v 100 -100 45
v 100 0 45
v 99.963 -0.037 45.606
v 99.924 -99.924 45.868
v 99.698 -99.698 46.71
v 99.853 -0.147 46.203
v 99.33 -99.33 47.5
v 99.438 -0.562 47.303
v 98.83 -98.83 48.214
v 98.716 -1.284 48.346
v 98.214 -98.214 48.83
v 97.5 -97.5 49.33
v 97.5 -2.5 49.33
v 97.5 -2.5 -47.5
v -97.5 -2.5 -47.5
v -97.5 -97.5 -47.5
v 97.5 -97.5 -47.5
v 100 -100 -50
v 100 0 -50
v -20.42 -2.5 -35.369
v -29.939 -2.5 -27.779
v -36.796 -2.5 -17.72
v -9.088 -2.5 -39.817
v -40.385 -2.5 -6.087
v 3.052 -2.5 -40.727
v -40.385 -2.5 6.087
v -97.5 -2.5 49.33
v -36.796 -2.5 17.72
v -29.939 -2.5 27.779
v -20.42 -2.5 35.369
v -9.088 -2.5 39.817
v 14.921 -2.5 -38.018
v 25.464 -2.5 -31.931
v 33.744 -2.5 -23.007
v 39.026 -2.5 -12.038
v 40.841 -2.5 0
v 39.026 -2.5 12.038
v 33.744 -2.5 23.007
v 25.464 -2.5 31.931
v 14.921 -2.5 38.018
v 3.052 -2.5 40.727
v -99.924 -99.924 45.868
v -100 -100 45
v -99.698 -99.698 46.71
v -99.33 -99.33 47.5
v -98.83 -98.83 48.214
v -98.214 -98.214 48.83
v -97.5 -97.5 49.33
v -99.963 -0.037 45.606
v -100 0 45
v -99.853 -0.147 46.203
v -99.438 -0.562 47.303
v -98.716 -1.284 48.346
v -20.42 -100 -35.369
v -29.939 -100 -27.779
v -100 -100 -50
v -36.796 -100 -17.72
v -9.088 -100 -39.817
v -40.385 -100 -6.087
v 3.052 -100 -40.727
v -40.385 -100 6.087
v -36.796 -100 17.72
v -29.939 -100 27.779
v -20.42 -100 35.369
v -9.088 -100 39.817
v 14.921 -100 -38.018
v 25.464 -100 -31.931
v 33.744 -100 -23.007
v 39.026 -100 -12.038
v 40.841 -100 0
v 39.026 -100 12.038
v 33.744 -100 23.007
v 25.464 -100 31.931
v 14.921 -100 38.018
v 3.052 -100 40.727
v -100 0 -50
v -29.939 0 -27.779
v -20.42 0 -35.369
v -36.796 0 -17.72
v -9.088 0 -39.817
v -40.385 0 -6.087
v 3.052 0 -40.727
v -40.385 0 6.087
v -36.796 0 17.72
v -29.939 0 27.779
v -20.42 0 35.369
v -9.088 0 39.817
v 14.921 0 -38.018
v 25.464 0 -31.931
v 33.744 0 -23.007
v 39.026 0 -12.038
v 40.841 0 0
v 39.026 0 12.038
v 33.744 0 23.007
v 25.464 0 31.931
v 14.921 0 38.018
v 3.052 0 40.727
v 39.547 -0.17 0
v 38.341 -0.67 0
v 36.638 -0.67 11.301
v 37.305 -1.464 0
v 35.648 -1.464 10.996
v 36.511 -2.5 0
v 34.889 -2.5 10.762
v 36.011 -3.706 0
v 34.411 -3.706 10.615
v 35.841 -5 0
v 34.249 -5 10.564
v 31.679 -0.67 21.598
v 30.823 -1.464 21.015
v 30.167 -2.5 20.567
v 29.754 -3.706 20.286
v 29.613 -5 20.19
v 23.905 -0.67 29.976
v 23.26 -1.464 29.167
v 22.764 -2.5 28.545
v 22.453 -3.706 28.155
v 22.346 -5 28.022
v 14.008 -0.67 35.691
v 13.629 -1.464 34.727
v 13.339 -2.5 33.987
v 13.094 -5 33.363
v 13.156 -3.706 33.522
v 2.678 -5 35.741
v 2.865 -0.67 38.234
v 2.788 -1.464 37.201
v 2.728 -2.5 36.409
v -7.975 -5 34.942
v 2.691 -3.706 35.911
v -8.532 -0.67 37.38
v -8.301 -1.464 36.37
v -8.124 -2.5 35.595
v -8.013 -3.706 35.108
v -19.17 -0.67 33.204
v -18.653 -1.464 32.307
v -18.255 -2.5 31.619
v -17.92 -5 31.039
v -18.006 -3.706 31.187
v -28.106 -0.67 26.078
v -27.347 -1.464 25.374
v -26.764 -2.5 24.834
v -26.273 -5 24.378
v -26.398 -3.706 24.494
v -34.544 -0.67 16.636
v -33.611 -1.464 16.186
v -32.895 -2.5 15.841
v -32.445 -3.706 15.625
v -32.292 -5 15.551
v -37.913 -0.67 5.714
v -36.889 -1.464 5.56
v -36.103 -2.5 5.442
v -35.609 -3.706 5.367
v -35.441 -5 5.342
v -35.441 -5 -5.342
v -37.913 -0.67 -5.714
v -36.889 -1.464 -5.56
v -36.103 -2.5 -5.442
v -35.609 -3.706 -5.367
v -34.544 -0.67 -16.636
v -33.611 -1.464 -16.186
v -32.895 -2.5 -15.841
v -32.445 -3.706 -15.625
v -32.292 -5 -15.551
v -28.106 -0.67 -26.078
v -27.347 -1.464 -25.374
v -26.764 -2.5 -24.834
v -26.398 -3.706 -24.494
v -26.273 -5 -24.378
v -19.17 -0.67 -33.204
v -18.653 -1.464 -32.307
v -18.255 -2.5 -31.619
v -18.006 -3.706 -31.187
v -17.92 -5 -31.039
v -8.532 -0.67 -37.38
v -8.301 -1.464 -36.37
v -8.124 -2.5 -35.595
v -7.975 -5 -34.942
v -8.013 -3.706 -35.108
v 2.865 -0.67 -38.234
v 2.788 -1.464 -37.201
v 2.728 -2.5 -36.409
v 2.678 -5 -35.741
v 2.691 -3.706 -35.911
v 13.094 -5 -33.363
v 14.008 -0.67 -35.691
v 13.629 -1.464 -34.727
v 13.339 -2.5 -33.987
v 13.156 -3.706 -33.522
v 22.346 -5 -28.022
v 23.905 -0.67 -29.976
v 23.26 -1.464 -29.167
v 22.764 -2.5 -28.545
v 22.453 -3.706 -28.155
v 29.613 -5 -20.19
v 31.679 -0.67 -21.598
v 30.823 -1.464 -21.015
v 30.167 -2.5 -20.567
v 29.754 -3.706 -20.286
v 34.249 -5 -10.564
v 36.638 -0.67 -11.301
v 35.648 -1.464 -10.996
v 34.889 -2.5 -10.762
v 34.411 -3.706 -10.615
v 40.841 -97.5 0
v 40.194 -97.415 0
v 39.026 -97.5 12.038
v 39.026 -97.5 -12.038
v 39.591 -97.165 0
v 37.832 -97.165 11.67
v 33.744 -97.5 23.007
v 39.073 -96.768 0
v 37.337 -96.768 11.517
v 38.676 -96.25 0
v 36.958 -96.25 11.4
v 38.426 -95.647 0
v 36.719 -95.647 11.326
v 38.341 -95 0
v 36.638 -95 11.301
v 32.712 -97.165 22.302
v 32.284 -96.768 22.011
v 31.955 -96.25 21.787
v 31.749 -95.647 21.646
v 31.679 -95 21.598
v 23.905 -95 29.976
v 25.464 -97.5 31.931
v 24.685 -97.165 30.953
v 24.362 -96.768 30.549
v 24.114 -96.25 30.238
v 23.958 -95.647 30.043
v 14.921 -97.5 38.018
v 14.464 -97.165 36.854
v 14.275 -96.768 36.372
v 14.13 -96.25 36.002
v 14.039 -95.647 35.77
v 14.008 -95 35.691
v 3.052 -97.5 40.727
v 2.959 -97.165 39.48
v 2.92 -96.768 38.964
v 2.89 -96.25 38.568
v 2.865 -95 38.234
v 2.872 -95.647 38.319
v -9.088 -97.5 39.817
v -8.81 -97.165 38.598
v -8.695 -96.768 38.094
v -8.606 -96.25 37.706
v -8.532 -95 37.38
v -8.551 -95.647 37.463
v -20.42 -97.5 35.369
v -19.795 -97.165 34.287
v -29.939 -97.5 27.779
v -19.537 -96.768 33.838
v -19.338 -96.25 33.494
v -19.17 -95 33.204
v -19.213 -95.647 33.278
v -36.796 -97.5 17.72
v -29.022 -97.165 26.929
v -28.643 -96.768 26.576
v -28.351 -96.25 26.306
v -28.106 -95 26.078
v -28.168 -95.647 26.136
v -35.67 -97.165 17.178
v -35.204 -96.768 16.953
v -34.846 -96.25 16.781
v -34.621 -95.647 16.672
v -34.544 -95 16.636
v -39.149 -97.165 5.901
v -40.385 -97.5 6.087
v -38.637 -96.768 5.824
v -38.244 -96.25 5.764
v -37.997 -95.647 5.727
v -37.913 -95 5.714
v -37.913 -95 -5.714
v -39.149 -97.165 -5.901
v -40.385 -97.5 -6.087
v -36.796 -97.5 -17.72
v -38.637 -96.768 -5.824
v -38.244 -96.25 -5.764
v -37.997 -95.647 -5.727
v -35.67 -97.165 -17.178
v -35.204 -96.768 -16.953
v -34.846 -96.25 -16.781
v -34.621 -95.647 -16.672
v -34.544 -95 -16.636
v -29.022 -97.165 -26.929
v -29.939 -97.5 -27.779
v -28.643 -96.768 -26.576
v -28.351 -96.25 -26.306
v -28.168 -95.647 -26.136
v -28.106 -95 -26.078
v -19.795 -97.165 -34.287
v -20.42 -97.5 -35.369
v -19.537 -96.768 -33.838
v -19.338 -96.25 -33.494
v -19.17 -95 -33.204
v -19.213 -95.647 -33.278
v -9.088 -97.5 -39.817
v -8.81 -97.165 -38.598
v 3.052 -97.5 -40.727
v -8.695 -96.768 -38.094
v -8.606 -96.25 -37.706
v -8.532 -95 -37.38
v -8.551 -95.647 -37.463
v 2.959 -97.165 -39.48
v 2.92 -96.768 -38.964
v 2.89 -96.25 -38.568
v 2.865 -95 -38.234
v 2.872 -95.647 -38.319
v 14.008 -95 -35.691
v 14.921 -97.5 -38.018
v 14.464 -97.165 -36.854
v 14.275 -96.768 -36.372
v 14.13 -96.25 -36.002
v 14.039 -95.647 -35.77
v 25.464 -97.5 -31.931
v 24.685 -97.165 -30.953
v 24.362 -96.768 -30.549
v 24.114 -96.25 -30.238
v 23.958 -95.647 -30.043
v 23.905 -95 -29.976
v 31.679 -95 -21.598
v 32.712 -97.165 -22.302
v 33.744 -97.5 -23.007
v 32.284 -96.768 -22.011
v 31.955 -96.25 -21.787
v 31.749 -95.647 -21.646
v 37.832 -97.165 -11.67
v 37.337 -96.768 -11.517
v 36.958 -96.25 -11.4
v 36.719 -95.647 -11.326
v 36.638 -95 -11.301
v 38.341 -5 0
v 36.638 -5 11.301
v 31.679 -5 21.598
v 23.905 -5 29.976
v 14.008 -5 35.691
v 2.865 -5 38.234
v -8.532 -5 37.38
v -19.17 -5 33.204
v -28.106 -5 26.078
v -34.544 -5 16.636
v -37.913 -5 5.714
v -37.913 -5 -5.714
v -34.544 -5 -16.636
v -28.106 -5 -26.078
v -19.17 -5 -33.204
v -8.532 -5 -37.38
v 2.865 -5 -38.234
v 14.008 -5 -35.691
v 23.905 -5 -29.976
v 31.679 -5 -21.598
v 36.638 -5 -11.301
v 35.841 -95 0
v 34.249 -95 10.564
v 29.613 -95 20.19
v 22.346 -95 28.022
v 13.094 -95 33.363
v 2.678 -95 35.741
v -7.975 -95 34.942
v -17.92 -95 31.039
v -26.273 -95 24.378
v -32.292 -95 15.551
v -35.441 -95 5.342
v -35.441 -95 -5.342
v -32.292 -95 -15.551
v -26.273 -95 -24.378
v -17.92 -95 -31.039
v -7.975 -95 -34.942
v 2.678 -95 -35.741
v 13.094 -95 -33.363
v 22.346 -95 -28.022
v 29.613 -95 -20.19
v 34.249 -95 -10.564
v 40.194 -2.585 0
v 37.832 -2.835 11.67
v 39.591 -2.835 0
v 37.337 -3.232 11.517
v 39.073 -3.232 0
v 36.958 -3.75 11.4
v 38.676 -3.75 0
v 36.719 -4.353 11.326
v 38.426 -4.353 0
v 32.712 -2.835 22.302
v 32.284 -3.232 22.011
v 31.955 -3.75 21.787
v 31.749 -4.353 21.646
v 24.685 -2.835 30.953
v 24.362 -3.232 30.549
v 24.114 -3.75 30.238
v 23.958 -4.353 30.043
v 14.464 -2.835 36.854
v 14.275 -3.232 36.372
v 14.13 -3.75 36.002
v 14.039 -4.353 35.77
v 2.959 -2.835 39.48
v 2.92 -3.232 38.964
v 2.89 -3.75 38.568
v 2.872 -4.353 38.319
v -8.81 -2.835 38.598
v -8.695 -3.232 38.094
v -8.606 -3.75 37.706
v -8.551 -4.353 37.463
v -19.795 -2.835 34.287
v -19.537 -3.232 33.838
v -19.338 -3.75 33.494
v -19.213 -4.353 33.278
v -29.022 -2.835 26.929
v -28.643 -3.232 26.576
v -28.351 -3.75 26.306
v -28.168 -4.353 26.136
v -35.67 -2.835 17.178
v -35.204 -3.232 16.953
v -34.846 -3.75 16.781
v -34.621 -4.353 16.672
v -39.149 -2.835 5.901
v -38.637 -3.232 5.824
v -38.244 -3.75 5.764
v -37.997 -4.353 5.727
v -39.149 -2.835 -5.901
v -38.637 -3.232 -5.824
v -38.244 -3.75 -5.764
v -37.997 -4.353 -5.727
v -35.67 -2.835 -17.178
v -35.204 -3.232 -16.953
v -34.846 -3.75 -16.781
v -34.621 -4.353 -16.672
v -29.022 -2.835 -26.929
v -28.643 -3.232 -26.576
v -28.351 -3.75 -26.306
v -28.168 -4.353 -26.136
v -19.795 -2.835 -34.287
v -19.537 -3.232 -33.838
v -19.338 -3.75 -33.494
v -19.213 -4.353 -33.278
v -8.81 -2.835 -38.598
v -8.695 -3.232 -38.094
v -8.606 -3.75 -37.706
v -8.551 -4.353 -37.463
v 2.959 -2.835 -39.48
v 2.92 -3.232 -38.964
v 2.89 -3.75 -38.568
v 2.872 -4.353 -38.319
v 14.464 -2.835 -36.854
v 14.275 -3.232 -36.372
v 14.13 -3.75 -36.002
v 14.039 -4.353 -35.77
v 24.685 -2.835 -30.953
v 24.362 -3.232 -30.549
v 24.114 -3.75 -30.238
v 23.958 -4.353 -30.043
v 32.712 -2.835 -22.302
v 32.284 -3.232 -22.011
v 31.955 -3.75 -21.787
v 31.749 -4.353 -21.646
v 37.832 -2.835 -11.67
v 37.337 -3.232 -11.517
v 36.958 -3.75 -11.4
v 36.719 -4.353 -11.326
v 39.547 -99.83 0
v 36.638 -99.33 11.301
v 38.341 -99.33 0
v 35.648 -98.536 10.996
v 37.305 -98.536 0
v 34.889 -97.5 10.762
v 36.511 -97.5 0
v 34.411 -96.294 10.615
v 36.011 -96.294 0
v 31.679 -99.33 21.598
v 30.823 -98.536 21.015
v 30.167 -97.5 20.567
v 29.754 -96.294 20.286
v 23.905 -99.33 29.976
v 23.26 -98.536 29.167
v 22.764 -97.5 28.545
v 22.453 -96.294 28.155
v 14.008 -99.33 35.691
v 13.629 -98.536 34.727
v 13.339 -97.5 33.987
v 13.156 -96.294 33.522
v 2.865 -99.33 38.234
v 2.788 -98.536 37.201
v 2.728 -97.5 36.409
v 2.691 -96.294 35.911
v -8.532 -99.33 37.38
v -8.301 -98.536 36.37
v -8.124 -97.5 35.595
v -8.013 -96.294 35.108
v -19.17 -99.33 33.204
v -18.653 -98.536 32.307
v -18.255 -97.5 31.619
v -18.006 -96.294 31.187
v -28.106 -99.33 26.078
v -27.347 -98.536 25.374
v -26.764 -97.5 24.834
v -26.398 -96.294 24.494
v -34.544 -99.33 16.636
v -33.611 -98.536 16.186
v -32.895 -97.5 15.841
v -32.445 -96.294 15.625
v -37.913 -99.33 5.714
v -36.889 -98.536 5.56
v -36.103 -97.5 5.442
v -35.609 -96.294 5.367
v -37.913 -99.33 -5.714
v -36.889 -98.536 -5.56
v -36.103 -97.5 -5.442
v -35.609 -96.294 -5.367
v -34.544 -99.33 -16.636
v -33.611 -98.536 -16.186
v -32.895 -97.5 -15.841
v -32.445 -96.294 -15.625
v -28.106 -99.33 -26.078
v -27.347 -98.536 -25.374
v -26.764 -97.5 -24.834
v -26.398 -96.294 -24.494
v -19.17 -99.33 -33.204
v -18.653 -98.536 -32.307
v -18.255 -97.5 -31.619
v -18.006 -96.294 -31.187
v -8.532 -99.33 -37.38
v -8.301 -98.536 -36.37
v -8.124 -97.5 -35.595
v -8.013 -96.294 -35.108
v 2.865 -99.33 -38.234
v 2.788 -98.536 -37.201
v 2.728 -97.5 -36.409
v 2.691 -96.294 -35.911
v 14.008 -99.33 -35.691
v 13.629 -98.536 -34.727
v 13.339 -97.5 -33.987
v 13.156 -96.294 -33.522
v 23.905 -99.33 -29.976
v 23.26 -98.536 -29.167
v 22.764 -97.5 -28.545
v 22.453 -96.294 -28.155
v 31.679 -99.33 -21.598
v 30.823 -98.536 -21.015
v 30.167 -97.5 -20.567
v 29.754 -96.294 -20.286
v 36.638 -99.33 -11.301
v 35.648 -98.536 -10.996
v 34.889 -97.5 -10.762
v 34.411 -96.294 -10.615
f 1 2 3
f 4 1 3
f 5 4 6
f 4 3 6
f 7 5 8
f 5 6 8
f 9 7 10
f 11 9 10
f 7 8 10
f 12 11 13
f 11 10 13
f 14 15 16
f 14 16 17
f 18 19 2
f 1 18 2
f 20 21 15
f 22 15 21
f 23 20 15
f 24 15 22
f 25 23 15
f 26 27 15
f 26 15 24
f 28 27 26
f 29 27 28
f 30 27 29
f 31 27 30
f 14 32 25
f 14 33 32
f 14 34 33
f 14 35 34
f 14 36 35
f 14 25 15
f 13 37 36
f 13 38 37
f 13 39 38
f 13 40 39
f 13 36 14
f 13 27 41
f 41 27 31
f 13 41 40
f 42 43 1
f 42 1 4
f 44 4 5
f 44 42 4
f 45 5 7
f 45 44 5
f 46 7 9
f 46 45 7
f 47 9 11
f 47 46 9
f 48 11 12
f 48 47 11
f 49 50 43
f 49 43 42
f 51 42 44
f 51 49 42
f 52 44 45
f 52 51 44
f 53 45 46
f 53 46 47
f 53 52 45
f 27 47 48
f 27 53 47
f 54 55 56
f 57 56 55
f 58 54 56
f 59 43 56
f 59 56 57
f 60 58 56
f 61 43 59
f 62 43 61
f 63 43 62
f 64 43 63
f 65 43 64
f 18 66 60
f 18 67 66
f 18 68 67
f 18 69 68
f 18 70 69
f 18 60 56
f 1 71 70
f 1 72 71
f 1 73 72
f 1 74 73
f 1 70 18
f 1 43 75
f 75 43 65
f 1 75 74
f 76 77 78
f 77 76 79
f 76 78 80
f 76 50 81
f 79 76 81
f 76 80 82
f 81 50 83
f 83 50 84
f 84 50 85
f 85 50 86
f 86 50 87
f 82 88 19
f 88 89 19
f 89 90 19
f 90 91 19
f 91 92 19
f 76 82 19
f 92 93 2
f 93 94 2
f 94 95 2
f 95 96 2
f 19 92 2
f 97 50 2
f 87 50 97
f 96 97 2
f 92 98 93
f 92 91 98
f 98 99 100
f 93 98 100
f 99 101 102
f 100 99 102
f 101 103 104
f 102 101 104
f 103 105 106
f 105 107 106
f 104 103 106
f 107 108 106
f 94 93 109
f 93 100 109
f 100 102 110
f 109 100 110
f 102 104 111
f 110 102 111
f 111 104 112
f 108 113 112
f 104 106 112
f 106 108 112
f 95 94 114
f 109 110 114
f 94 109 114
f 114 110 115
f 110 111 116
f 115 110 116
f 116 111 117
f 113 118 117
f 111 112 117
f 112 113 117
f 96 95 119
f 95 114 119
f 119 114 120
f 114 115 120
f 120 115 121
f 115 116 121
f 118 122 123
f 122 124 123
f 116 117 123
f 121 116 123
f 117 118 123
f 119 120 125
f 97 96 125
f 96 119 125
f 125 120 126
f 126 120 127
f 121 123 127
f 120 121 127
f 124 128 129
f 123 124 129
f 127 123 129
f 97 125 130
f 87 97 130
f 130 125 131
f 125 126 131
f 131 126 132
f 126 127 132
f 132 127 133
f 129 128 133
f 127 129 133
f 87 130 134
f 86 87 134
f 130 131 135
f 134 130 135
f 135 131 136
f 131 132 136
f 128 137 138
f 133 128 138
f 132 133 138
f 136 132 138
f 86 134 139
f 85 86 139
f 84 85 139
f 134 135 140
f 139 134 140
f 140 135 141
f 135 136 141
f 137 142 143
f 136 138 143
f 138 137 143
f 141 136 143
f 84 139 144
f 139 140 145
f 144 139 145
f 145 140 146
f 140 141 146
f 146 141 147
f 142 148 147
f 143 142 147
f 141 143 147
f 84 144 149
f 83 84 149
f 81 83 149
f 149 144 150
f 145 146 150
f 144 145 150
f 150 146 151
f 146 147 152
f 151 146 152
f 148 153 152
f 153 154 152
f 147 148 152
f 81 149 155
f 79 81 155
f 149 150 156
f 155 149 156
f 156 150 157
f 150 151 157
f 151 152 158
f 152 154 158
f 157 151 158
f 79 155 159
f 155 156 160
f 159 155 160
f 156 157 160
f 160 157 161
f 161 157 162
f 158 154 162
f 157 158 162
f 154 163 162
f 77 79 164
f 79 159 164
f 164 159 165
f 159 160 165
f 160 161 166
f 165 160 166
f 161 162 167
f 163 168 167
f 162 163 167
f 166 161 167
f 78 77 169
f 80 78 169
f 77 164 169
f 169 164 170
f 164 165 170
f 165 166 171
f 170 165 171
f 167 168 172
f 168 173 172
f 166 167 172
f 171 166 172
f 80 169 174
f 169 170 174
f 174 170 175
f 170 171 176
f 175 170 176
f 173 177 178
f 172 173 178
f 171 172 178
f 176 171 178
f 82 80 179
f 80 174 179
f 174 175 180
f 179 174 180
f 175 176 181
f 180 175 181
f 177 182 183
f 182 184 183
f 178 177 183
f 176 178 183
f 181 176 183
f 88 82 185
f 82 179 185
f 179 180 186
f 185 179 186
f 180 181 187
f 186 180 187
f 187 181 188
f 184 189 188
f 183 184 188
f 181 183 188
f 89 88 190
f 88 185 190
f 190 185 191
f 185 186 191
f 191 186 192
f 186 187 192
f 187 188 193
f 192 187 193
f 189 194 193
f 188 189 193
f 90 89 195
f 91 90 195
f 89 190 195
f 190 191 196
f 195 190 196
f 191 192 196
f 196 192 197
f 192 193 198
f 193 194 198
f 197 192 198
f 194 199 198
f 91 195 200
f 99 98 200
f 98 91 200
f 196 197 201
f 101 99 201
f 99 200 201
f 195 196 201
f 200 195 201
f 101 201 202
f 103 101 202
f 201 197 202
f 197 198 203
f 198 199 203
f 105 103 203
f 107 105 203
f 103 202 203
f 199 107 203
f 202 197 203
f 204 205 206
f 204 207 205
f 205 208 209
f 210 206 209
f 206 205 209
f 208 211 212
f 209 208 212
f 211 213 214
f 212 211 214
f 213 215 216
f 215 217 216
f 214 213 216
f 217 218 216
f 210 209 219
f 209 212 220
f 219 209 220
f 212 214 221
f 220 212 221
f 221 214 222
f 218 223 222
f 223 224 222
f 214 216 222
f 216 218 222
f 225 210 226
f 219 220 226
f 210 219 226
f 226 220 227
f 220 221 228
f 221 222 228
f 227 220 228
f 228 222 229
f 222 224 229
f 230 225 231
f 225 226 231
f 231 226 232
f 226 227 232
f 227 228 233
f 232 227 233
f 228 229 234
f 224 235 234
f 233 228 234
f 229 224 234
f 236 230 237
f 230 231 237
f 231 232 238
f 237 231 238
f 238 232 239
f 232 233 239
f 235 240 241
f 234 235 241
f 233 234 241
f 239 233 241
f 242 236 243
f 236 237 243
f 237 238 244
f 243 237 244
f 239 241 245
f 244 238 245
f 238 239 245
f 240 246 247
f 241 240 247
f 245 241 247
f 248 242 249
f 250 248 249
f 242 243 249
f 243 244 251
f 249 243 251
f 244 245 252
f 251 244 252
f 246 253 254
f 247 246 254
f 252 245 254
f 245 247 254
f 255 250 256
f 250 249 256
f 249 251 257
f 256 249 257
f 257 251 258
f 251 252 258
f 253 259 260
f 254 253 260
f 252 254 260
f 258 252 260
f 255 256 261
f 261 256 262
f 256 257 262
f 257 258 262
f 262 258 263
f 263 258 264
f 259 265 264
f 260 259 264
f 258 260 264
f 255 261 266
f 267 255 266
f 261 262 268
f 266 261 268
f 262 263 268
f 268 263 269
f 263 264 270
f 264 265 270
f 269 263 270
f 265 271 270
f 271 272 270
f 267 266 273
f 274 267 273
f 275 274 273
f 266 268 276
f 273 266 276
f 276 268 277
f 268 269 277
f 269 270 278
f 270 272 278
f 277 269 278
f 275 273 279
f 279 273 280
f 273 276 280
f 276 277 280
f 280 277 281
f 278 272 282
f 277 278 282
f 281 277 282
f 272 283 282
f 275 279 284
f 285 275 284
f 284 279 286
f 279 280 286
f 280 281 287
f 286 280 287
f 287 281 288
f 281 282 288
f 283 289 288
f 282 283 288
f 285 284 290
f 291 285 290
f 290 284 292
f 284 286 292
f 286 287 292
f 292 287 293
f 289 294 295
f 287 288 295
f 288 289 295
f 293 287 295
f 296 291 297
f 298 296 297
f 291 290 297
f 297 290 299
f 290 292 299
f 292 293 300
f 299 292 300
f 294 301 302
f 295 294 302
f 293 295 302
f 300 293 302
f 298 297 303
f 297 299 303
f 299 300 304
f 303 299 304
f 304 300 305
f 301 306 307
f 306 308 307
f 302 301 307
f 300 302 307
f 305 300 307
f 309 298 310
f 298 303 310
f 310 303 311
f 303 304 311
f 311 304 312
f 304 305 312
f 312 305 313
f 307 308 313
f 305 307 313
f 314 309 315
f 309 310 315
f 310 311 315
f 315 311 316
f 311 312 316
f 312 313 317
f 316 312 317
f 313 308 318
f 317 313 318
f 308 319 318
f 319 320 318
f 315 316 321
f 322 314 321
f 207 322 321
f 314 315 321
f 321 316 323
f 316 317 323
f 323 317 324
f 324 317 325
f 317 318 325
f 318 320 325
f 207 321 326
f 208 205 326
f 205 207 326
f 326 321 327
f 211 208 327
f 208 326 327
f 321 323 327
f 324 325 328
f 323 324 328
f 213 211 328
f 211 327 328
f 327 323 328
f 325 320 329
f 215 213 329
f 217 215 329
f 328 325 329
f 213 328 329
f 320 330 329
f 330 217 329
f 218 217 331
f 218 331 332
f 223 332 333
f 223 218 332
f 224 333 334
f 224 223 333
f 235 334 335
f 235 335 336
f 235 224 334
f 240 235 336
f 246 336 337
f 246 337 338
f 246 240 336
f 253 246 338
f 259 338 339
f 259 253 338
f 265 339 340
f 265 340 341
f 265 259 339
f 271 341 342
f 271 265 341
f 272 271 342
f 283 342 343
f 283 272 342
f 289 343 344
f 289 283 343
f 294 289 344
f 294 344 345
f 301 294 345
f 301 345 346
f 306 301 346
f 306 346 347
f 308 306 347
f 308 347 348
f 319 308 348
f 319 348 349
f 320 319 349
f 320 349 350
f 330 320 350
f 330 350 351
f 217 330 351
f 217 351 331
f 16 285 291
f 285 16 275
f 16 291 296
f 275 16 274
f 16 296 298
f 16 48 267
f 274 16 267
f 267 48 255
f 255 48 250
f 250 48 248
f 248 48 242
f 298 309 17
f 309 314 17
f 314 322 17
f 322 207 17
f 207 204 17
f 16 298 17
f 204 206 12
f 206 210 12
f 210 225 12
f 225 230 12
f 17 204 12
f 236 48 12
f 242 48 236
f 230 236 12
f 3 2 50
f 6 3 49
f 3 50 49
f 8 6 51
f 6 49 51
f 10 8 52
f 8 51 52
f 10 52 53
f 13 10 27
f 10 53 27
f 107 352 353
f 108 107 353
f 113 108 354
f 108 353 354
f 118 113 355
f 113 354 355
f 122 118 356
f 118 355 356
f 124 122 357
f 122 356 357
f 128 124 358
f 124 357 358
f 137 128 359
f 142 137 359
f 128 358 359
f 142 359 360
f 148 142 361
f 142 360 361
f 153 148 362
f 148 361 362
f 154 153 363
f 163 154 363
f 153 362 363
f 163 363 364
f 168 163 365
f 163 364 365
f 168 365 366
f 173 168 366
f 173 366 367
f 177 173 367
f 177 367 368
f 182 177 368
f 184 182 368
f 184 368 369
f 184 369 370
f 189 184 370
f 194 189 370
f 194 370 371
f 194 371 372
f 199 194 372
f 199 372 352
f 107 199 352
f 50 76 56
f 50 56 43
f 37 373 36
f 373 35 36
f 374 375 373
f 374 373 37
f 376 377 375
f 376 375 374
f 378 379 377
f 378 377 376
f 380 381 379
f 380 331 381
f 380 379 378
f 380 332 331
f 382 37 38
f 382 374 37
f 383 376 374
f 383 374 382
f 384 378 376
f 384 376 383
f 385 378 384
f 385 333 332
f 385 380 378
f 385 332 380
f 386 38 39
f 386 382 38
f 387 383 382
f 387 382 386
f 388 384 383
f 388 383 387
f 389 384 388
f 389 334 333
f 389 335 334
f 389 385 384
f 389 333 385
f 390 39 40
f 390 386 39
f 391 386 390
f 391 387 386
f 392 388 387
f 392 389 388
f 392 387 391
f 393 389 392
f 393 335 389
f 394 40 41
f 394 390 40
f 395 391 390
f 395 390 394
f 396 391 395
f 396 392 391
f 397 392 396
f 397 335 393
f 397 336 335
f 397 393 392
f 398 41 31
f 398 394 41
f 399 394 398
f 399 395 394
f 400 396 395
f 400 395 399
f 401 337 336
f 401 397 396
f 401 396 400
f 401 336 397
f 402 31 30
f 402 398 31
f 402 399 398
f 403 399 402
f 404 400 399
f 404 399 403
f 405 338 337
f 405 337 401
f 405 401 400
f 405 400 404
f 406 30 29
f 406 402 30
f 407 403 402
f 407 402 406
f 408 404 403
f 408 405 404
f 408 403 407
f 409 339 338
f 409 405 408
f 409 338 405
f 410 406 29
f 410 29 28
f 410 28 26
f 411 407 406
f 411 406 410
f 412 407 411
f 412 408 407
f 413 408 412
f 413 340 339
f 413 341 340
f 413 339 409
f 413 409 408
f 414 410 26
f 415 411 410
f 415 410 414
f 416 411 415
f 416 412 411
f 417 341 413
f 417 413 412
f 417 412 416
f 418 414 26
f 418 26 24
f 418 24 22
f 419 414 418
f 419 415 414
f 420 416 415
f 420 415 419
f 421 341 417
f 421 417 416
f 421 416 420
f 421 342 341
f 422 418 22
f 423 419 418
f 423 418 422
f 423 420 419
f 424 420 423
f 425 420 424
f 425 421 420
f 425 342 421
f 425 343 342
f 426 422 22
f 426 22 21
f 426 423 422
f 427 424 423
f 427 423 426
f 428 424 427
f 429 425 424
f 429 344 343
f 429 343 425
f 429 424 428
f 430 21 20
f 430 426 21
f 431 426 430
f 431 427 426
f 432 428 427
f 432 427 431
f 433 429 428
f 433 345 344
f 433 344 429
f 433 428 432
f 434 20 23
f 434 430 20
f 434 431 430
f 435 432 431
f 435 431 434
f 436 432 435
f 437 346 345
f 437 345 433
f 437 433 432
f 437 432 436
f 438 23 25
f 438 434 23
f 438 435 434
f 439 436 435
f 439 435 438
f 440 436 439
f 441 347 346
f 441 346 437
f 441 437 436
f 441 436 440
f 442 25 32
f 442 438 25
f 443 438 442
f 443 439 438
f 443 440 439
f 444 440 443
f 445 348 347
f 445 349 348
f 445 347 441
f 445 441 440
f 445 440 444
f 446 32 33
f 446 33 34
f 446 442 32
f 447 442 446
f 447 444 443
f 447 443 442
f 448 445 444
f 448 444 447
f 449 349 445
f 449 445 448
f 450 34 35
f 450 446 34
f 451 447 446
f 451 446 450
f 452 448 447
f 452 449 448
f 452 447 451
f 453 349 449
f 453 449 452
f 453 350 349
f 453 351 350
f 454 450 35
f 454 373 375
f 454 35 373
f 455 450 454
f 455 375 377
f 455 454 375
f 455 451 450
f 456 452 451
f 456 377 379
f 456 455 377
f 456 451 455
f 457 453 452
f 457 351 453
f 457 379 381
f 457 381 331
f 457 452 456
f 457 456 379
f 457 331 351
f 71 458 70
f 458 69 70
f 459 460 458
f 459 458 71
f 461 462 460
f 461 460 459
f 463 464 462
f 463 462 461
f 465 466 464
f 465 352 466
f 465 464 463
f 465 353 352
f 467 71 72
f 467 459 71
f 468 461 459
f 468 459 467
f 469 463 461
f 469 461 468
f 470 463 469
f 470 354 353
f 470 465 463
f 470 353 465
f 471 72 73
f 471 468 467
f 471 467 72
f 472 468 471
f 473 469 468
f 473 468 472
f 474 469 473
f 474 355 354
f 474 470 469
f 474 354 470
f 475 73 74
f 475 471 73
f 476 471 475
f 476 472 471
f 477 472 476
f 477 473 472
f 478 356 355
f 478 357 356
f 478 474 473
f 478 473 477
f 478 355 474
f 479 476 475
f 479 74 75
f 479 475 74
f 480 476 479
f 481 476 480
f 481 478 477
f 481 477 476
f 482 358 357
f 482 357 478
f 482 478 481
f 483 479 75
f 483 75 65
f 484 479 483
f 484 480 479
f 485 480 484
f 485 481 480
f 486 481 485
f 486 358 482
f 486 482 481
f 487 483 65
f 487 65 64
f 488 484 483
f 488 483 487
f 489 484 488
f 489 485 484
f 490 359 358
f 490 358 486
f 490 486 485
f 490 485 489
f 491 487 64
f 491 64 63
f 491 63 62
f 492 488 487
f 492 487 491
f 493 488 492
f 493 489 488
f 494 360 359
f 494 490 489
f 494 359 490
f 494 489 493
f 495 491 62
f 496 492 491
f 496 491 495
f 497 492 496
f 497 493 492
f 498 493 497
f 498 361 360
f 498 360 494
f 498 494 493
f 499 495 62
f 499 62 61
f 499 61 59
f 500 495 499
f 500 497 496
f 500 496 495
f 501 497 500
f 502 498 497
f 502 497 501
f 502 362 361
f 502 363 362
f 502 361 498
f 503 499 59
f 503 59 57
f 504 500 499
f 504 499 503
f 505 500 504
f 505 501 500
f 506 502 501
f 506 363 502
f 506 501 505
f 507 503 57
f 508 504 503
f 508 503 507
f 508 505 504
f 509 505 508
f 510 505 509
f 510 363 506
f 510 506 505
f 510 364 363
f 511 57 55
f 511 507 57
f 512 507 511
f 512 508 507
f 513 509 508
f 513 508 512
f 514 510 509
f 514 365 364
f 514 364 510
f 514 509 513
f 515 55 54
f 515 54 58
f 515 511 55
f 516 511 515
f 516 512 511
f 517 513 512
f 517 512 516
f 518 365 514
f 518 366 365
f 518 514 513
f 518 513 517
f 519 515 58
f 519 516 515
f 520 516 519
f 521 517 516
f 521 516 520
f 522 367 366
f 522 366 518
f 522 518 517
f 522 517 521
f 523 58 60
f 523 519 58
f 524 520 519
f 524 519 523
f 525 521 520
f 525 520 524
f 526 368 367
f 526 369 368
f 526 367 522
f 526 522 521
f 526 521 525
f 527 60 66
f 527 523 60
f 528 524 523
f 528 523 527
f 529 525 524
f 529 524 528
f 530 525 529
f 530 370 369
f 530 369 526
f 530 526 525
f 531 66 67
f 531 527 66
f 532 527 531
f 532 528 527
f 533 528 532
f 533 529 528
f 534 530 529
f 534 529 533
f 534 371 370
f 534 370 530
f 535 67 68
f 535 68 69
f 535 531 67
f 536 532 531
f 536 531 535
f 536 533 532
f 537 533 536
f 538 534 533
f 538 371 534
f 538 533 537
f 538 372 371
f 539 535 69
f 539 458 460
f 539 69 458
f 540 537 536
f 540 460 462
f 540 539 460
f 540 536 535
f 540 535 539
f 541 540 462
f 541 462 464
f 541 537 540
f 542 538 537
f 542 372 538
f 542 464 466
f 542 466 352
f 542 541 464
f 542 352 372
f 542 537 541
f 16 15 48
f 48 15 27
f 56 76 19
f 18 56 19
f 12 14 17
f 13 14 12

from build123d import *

# Parameters (mm, degrees)
F0_W        = 200
F0_H        = 100
F1_DEPTH    = 100
F2_R        = 35.8409251955
F3_DEPTH    = 100.001
F4_R        = 5
F5_T        = -2.5
F6_T1_DEPTH = 225
F6_T3_DEPTH = 125


# Not quite as in the source:
# - a fillet or chamfer that OpenCascade refuses, or shapes differently, is made with other operations: its cross-section is extruded or revolved along the edge and cut away or added


with BuildPart() as f1:
    # F0 (on Front) → F1 (new body)
    with BuildSketch(Plane.XZ):
        Rectangle(F0_W, F0_H)
    extrude(amount=F1_DEPTH)

    # F2 (on face) → F3 (cut, through all)
    with BuildSketch(Plane.XZ.offset(100)):
        Circle(F2_R)
    extrude(amount=-F3_DEPTH, mode=Mode.SUBTRACT)

    # F4
    f4_edges = [f1.edges().sort_by_distance(p)[0] for p in [
        (-35.840925, -100, 0),
        (-35.840925, 0, 0),
    ]]
    fillet(f4_edges, radius=F4_R)

    # F5
    f5_openings = [f1.faces().sort_by_distance(p)[0] for p in [
        (0, -50, 50),
    ]]
    offset(amount=F5_T, openings=f5_openings)

    # F6: fillet of radius 5 on 4 edges, made by hand

    # F6_s2 → F6_t1 (cut)
    with BuildSketch(Plane.YZ.offset(-112.5)):
        with BuildLine():
            ThreePointArc((-100, 45), (-98.5355339059, 48.5355339059), (-95, 50))
            Line((-95, 50), (-100, 50))
            Line((-100, 50), (-100, 45))
        make_face()
        with BuildLine():
            ThreePointArc((0, 45), (-1.4644660941, 48.5355339059), (-5, 50))
            Line((-5, 50), (0, 50))
            Line((0, 50), (0, 45))
        make_face()
    extrude(amount=F6_T1_DEPTH, mode=Mode.SUBTRACT)

    # F6_s4 → F6_t3 (cut)
    with BuildSketch(Plane.XZ.offset(-12.5)):
        with BuildLine():
            ThreePointArc((-100, 45), (-98.5355339059, 48.5355339059), (-95, 50))
            Line((-95, 50), (-100, 50))
            Line((-100, 50), (-100, 45))
        make_face()
        with BuildLine():
            ThreePointArc((100, 45), (98.5355339059, 48.5355339059), (95, 50))
            Line((95, 50), (100, 50))
            Line((100, 50), (100, 45))
        make_face()
    extrude(amount=F6_T3_DEPTH, mode=Mode.SUBTRACT)


solid = f1.part
